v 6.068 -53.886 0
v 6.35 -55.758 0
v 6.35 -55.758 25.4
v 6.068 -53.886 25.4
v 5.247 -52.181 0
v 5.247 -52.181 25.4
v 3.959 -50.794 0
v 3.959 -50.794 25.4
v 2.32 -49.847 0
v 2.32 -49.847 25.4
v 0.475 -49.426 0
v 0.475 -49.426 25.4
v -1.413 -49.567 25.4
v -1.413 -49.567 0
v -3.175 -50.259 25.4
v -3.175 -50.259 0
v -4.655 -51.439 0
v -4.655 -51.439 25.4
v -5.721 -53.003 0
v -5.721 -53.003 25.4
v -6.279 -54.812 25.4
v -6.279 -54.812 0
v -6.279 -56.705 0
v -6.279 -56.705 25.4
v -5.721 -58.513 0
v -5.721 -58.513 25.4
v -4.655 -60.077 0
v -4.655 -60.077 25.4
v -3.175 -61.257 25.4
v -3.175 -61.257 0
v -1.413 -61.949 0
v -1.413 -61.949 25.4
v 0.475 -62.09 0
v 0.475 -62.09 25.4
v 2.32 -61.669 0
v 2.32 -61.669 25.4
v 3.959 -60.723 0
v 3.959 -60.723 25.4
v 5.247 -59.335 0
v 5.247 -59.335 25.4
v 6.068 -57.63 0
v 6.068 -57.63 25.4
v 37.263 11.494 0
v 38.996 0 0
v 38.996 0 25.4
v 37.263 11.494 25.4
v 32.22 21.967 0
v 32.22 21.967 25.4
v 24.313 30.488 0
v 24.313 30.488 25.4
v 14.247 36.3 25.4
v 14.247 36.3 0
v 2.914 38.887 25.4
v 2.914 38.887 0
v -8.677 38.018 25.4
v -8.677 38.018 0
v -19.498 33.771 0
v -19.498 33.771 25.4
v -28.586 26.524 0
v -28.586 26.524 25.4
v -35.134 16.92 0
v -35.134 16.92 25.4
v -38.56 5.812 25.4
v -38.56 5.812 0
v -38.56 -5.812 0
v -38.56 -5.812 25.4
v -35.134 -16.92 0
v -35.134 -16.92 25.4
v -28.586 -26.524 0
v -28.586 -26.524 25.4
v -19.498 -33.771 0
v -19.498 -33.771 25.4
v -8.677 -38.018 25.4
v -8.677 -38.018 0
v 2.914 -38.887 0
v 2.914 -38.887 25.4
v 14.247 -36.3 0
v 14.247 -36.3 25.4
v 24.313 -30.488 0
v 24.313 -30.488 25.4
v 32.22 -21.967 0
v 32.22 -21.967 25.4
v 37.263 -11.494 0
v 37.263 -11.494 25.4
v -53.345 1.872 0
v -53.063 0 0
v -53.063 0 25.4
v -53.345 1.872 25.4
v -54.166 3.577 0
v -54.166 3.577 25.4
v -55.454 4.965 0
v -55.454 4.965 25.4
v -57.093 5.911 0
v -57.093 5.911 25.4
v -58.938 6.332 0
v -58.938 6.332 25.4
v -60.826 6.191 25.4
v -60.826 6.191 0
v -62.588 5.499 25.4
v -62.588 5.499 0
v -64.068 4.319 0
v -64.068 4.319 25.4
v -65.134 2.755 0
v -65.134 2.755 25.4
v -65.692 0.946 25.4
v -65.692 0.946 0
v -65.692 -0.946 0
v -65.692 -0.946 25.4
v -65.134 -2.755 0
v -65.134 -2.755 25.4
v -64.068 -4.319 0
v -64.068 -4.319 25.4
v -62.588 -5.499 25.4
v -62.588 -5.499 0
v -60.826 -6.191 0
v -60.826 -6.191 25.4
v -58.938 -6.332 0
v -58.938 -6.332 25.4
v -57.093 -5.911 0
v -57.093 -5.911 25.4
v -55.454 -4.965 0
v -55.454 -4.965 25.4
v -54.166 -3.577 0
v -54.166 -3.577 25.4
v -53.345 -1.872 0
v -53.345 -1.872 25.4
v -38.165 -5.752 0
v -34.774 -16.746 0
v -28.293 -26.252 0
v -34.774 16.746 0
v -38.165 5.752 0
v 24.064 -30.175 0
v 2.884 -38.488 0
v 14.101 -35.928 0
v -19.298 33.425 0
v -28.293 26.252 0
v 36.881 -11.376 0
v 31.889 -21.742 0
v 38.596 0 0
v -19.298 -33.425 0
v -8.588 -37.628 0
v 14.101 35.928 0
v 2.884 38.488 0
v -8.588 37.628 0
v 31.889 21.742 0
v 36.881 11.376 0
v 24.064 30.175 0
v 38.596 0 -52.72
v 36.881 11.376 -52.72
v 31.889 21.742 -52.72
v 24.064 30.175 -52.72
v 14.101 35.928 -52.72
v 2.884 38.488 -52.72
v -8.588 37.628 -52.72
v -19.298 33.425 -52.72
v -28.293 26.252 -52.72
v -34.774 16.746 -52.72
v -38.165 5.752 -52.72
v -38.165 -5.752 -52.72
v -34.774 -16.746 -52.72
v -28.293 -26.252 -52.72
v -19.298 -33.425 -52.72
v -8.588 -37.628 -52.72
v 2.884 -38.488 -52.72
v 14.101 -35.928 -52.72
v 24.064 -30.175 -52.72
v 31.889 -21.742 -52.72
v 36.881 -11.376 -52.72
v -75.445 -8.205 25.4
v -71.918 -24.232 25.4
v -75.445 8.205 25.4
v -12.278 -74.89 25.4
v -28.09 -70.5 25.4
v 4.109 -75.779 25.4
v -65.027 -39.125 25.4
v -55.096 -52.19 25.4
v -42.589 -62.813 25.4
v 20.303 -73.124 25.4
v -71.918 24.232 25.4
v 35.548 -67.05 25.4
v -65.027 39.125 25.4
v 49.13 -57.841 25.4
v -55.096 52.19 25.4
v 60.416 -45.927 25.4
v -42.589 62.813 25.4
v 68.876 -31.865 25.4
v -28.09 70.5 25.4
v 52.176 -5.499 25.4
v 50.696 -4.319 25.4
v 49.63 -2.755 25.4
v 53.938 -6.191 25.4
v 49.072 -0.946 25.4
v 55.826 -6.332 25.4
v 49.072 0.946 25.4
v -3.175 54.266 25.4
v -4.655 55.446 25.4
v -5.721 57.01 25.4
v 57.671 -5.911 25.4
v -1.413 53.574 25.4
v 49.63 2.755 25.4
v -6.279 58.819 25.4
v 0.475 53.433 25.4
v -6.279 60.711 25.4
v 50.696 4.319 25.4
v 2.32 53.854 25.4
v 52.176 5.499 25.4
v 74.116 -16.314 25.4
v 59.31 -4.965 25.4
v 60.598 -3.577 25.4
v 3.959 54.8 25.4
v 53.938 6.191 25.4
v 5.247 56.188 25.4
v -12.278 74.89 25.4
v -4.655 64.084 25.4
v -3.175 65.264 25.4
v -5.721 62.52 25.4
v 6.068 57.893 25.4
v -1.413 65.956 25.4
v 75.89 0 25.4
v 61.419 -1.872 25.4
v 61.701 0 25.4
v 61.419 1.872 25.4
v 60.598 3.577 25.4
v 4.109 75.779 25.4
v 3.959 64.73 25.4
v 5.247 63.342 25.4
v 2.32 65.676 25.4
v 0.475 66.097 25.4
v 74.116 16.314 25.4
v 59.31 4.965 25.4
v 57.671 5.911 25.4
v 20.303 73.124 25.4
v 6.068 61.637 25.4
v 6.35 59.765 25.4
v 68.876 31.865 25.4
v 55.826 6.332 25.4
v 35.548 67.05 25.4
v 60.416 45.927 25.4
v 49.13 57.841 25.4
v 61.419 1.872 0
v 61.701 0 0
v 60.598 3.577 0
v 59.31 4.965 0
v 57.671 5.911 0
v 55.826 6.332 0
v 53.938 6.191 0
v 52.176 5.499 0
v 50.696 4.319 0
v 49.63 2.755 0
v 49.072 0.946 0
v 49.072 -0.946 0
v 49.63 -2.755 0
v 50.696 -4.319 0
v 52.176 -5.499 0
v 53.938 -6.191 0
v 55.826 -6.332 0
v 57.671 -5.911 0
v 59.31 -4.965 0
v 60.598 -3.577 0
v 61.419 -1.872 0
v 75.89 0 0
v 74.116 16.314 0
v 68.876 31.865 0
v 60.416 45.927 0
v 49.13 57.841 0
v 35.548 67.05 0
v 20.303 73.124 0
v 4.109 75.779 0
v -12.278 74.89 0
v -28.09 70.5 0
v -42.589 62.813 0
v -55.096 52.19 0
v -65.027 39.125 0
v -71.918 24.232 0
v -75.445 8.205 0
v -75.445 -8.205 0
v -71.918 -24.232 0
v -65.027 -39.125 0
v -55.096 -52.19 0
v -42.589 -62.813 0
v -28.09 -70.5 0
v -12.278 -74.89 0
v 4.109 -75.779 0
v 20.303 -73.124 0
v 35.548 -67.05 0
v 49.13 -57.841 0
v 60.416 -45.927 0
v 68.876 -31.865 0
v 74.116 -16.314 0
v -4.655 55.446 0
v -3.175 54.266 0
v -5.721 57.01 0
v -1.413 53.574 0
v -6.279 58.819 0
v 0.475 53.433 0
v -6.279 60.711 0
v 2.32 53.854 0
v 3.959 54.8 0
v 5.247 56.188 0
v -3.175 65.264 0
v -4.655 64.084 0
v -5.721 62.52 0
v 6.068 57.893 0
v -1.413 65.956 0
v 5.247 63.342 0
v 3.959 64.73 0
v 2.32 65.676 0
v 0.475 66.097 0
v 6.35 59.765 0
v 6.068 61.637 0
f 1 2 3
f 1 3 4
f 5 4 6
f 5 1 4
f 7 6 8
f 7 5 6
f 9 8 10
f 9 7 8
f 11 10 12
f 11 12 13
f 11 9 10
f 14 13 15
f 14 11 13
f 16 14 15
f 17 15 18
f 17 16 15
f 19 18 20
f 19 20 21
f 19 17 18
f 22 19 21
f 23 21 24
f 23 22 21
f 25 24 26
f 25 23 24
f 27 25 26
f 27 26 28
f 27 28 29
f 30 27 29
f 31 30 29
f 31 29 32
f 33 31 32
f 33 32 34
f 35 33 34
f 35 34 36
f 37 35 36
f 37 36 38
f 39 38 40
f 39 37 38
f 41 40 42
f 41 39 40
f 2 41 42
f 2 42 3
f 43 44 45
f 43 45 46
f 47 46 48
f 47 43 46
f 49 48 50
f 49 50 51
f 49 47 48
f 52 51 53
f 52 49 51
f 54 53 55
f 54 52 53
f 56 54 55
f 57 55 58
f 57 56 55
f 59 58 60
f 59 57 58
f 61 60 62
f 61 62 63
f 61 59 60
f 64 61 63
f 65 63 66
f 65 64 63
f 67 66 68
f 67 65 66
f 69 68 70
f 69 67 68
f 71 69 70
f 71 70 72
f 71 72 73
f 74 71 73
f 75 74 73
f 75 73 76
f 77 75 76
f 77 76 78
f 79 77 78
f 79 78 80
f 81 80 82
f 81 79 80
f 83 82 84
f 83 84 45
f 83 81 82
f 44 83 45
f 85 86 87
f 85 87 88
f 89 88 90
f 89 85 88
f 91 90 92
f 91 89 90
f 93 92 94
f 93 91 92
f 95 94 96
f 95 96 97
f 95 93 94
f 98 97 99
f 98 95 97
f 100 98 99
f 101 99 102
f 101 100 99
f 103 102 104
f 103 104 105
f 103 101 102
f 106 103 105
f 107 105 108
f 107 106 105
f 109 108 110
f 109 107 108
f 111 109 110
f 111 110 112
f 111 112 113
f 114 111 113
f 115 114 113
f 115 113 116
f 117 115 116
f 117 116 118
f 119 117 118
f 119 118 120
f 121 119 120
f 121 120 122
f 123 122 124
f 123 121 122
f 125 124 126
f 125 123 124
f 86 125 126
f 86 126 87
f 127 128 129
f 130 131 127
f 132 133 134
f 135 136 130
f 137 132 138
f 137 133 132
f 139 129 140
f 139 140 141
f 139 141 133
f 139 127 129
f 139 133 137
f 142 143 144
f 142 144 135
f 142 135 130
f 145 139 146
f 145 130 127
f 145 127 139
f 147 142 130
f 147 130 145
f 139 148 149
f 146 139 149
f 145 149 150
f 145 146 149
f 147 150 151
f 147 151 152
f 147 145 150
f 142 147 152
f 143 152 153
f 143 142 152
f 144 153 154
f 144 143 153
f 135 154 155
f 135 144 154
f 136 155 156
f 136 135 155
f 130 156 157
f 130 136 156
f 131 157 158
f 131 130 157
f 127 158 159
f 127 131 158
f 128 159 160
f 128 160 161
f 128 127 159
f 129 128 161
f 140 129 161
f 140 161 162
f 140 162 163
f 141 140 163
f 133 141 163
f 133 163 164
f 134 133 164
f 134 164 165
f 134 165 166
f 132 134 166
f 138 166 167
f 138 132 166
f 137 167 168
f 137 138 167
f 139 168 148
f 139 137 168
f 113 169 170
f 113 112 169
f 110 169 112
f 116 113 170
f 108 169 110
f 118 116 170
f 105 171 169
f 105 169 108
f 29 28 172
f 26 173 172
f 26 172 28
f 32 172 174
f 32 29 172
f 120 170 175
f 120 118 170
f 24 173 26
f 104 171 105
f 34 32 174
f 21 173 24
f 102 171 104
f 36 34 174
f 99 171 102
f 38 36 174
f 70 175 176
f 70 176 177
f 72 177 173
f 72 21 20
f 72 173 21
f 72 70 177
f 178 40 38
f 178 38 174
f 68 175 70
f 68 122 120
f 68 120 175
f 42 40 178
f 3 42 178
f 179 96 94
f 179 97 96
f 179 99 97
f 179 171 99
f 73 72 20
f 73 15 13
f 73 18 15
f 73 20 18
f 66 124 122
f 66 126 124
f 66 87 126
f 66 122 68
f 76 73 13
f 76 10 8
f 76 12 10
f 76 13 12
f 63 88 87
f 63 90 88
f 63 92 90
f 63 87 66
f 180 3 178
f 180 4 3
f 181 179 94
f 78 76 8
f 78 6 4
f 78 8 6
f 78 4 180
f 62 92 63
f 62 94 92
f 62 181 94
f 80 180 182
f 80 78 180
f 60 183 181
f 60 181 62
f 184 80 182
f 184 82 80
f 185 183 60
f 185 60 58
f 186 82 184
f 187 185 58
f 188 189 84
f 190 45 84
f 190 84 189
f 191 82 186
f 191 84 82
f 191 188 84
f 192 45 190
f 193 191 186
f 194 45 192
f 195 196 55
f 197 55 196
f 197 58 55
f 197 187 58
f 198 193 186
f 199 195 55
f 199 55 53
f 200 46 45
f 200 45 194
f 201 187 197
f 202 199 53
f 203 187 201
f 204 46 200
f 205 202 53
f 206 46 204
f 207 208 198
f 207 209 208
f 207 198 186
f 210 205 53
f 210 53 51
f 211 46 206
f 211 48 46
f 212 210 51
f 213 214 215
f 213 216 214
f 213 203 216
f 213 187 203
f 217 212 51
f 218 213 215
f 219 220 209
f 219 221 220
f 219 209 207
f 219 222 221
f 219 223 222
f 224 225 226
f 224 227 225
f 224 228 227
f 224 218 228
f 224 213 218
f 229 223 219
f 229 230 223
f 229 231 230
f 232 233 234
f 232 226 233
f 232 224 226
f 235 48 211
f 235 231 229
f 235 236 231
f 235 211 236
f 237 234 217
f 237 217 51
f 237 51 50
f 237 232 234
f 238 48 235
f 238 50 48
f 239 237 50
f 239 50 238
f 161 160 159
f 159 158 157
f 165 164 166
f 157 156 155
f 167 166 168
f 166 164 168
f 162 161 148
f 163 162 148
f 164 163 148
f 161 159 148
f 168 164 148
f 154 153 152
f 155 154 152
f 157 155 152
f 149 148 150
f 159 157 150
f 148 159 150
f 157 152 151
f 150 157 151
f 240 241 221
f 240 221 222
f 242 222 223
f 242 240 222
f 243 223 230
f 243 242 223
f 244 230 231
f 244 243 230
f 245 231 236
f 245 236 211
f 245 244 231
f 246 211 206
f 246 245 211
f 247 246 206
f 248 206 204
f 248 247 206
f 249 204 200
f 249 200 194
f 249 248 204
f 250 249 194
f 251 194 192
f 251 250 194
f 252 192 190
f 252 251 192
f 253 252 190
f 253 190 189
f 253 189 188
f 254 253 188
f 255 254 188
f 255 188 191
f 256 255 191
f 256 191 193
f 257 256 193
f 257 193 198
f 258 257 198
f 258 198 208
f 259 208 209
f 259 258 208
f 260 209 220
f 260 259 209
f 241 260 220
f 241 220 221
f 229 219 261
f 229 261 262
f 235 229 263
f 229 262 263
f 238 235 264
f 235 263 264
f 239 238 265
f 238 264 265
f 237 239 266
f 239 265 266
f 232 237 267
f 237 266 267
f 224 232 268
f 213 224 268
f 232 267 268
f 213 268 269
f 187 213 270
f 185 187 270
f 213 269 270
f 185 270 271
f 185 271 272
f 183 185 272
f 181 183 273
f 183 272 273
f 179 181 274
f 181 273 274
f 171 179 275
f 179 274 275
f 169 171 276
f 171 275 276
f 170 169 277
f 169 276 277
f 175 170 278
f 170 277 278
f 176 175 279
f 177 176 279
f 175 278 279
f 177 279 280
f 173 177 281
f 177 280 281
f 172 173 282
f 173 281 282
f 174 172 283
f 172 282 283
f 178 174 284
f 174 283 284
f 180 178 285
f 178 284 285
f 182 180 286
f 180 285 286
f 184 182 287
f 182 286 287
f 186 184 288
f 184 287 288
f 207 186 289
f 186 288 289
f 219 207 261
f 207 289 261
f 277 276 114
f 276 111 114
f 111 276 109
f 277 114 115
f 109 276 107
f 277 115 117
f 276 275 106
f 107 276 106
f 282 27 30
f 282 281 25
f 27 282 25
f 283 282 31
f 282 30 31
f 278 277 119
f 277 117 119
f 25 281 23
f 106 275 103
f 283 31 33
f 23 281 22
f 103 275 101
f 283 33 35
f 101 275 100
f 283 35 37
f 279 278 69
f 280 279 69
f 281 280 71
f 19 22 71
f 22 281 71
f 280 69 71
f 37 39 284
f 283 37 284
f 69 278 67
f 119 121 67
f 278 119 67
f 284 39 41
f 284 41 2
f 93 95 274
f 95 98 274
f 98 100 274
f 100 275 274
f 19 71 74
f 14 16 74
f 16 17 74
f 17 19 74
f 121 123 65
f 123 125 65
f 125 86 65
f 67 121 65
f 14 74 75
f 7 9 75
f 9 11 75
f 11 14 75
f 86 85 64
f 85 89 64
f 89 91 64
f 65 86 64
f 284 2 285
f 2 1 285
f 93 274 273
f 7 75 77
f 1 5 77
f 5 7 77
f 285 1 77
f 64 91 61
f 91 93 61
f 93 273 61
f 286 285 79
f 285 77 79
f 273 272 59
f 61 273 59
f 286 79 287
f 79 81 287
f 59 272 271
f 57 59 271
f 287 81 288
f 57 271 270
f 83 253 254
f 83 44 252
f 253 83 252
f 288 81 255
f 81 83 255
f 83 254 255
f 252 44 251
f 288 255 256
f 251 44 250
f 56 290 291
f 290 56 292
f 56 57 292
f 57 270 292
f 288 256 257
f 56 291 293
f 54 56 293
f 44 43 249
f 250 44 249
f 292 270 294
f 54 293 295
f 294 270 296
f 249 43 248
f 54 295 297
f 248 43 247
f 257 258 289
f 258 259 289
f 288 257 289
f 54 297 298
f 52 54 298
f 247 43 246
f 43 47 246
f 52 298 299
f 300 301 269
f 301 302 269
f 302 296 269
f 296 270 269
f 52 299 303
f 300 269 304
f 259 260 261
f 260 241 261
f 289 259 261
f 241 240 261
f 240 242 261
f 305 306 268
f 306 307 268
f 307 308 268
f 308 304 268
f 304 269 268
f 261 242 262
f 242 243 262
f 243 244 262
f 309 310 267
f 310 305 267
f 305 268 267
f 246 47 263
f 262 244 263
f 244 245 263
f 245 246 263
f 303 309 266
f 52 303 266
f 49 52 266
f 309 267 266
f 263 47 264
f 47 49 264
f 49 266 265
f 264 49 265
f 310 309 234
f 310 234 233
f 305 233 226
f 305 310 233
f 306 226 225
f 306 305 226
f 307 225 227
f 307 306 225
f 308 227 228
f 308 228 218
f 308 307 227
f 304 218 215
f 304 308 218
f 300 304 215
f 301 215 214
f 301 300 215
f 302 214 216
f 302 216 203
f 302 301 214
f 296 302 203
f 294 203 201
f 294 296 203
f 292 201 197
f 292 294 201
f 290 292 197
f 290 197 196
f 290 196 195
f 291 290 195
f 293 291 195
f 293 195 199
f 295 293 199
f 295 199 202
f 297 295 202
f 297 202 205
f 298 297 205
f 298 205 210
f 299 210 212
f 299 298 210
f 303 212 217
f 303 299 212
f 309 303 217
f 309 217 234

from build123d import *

# Parameters (mm, degrees)
F0_R     = 75.890135
F0_R_2   = 6.35
F0_R_3   = 38.995552
F1_DEPTH = 25.4
F2_R     = 38.595805
F3_DEPTH = 52.720033


with BuildPart() as f1:
    # F0 (on Top) → F1 (new body)
    with BuildSketch(Plane.XY):
        Circle(F0_R)
        with Locations((0, -55.758134)):
            Circle(F0_R_2, mode=Mode.SUBTRACT)
        with Locations((-59.41274, 0)):
            Circle(F0_R_2, mode=Mode.SUBTRACT)
        Circle(F0_R_3, mode=Mode.SUBTRACT)
        with Locations((55.351153, 0)):
            Circle(F0_R_2, mode=Mode.SUBTRACT)
        with Locations((0, 59.764966)):
            Circle(F0_R_2, mode=Mode.SUBTRACT)
    extrude(amount=F1_DEPTH)


with BuildPart() as f3:
    # F2 (on Top) → F3 (new body)
    with BuildSketch(Plane.XY):
        Circle(F2_R)
    extrude(amount=-F3_DEPTH)


solid = Compound([f1.part, f3.part])
